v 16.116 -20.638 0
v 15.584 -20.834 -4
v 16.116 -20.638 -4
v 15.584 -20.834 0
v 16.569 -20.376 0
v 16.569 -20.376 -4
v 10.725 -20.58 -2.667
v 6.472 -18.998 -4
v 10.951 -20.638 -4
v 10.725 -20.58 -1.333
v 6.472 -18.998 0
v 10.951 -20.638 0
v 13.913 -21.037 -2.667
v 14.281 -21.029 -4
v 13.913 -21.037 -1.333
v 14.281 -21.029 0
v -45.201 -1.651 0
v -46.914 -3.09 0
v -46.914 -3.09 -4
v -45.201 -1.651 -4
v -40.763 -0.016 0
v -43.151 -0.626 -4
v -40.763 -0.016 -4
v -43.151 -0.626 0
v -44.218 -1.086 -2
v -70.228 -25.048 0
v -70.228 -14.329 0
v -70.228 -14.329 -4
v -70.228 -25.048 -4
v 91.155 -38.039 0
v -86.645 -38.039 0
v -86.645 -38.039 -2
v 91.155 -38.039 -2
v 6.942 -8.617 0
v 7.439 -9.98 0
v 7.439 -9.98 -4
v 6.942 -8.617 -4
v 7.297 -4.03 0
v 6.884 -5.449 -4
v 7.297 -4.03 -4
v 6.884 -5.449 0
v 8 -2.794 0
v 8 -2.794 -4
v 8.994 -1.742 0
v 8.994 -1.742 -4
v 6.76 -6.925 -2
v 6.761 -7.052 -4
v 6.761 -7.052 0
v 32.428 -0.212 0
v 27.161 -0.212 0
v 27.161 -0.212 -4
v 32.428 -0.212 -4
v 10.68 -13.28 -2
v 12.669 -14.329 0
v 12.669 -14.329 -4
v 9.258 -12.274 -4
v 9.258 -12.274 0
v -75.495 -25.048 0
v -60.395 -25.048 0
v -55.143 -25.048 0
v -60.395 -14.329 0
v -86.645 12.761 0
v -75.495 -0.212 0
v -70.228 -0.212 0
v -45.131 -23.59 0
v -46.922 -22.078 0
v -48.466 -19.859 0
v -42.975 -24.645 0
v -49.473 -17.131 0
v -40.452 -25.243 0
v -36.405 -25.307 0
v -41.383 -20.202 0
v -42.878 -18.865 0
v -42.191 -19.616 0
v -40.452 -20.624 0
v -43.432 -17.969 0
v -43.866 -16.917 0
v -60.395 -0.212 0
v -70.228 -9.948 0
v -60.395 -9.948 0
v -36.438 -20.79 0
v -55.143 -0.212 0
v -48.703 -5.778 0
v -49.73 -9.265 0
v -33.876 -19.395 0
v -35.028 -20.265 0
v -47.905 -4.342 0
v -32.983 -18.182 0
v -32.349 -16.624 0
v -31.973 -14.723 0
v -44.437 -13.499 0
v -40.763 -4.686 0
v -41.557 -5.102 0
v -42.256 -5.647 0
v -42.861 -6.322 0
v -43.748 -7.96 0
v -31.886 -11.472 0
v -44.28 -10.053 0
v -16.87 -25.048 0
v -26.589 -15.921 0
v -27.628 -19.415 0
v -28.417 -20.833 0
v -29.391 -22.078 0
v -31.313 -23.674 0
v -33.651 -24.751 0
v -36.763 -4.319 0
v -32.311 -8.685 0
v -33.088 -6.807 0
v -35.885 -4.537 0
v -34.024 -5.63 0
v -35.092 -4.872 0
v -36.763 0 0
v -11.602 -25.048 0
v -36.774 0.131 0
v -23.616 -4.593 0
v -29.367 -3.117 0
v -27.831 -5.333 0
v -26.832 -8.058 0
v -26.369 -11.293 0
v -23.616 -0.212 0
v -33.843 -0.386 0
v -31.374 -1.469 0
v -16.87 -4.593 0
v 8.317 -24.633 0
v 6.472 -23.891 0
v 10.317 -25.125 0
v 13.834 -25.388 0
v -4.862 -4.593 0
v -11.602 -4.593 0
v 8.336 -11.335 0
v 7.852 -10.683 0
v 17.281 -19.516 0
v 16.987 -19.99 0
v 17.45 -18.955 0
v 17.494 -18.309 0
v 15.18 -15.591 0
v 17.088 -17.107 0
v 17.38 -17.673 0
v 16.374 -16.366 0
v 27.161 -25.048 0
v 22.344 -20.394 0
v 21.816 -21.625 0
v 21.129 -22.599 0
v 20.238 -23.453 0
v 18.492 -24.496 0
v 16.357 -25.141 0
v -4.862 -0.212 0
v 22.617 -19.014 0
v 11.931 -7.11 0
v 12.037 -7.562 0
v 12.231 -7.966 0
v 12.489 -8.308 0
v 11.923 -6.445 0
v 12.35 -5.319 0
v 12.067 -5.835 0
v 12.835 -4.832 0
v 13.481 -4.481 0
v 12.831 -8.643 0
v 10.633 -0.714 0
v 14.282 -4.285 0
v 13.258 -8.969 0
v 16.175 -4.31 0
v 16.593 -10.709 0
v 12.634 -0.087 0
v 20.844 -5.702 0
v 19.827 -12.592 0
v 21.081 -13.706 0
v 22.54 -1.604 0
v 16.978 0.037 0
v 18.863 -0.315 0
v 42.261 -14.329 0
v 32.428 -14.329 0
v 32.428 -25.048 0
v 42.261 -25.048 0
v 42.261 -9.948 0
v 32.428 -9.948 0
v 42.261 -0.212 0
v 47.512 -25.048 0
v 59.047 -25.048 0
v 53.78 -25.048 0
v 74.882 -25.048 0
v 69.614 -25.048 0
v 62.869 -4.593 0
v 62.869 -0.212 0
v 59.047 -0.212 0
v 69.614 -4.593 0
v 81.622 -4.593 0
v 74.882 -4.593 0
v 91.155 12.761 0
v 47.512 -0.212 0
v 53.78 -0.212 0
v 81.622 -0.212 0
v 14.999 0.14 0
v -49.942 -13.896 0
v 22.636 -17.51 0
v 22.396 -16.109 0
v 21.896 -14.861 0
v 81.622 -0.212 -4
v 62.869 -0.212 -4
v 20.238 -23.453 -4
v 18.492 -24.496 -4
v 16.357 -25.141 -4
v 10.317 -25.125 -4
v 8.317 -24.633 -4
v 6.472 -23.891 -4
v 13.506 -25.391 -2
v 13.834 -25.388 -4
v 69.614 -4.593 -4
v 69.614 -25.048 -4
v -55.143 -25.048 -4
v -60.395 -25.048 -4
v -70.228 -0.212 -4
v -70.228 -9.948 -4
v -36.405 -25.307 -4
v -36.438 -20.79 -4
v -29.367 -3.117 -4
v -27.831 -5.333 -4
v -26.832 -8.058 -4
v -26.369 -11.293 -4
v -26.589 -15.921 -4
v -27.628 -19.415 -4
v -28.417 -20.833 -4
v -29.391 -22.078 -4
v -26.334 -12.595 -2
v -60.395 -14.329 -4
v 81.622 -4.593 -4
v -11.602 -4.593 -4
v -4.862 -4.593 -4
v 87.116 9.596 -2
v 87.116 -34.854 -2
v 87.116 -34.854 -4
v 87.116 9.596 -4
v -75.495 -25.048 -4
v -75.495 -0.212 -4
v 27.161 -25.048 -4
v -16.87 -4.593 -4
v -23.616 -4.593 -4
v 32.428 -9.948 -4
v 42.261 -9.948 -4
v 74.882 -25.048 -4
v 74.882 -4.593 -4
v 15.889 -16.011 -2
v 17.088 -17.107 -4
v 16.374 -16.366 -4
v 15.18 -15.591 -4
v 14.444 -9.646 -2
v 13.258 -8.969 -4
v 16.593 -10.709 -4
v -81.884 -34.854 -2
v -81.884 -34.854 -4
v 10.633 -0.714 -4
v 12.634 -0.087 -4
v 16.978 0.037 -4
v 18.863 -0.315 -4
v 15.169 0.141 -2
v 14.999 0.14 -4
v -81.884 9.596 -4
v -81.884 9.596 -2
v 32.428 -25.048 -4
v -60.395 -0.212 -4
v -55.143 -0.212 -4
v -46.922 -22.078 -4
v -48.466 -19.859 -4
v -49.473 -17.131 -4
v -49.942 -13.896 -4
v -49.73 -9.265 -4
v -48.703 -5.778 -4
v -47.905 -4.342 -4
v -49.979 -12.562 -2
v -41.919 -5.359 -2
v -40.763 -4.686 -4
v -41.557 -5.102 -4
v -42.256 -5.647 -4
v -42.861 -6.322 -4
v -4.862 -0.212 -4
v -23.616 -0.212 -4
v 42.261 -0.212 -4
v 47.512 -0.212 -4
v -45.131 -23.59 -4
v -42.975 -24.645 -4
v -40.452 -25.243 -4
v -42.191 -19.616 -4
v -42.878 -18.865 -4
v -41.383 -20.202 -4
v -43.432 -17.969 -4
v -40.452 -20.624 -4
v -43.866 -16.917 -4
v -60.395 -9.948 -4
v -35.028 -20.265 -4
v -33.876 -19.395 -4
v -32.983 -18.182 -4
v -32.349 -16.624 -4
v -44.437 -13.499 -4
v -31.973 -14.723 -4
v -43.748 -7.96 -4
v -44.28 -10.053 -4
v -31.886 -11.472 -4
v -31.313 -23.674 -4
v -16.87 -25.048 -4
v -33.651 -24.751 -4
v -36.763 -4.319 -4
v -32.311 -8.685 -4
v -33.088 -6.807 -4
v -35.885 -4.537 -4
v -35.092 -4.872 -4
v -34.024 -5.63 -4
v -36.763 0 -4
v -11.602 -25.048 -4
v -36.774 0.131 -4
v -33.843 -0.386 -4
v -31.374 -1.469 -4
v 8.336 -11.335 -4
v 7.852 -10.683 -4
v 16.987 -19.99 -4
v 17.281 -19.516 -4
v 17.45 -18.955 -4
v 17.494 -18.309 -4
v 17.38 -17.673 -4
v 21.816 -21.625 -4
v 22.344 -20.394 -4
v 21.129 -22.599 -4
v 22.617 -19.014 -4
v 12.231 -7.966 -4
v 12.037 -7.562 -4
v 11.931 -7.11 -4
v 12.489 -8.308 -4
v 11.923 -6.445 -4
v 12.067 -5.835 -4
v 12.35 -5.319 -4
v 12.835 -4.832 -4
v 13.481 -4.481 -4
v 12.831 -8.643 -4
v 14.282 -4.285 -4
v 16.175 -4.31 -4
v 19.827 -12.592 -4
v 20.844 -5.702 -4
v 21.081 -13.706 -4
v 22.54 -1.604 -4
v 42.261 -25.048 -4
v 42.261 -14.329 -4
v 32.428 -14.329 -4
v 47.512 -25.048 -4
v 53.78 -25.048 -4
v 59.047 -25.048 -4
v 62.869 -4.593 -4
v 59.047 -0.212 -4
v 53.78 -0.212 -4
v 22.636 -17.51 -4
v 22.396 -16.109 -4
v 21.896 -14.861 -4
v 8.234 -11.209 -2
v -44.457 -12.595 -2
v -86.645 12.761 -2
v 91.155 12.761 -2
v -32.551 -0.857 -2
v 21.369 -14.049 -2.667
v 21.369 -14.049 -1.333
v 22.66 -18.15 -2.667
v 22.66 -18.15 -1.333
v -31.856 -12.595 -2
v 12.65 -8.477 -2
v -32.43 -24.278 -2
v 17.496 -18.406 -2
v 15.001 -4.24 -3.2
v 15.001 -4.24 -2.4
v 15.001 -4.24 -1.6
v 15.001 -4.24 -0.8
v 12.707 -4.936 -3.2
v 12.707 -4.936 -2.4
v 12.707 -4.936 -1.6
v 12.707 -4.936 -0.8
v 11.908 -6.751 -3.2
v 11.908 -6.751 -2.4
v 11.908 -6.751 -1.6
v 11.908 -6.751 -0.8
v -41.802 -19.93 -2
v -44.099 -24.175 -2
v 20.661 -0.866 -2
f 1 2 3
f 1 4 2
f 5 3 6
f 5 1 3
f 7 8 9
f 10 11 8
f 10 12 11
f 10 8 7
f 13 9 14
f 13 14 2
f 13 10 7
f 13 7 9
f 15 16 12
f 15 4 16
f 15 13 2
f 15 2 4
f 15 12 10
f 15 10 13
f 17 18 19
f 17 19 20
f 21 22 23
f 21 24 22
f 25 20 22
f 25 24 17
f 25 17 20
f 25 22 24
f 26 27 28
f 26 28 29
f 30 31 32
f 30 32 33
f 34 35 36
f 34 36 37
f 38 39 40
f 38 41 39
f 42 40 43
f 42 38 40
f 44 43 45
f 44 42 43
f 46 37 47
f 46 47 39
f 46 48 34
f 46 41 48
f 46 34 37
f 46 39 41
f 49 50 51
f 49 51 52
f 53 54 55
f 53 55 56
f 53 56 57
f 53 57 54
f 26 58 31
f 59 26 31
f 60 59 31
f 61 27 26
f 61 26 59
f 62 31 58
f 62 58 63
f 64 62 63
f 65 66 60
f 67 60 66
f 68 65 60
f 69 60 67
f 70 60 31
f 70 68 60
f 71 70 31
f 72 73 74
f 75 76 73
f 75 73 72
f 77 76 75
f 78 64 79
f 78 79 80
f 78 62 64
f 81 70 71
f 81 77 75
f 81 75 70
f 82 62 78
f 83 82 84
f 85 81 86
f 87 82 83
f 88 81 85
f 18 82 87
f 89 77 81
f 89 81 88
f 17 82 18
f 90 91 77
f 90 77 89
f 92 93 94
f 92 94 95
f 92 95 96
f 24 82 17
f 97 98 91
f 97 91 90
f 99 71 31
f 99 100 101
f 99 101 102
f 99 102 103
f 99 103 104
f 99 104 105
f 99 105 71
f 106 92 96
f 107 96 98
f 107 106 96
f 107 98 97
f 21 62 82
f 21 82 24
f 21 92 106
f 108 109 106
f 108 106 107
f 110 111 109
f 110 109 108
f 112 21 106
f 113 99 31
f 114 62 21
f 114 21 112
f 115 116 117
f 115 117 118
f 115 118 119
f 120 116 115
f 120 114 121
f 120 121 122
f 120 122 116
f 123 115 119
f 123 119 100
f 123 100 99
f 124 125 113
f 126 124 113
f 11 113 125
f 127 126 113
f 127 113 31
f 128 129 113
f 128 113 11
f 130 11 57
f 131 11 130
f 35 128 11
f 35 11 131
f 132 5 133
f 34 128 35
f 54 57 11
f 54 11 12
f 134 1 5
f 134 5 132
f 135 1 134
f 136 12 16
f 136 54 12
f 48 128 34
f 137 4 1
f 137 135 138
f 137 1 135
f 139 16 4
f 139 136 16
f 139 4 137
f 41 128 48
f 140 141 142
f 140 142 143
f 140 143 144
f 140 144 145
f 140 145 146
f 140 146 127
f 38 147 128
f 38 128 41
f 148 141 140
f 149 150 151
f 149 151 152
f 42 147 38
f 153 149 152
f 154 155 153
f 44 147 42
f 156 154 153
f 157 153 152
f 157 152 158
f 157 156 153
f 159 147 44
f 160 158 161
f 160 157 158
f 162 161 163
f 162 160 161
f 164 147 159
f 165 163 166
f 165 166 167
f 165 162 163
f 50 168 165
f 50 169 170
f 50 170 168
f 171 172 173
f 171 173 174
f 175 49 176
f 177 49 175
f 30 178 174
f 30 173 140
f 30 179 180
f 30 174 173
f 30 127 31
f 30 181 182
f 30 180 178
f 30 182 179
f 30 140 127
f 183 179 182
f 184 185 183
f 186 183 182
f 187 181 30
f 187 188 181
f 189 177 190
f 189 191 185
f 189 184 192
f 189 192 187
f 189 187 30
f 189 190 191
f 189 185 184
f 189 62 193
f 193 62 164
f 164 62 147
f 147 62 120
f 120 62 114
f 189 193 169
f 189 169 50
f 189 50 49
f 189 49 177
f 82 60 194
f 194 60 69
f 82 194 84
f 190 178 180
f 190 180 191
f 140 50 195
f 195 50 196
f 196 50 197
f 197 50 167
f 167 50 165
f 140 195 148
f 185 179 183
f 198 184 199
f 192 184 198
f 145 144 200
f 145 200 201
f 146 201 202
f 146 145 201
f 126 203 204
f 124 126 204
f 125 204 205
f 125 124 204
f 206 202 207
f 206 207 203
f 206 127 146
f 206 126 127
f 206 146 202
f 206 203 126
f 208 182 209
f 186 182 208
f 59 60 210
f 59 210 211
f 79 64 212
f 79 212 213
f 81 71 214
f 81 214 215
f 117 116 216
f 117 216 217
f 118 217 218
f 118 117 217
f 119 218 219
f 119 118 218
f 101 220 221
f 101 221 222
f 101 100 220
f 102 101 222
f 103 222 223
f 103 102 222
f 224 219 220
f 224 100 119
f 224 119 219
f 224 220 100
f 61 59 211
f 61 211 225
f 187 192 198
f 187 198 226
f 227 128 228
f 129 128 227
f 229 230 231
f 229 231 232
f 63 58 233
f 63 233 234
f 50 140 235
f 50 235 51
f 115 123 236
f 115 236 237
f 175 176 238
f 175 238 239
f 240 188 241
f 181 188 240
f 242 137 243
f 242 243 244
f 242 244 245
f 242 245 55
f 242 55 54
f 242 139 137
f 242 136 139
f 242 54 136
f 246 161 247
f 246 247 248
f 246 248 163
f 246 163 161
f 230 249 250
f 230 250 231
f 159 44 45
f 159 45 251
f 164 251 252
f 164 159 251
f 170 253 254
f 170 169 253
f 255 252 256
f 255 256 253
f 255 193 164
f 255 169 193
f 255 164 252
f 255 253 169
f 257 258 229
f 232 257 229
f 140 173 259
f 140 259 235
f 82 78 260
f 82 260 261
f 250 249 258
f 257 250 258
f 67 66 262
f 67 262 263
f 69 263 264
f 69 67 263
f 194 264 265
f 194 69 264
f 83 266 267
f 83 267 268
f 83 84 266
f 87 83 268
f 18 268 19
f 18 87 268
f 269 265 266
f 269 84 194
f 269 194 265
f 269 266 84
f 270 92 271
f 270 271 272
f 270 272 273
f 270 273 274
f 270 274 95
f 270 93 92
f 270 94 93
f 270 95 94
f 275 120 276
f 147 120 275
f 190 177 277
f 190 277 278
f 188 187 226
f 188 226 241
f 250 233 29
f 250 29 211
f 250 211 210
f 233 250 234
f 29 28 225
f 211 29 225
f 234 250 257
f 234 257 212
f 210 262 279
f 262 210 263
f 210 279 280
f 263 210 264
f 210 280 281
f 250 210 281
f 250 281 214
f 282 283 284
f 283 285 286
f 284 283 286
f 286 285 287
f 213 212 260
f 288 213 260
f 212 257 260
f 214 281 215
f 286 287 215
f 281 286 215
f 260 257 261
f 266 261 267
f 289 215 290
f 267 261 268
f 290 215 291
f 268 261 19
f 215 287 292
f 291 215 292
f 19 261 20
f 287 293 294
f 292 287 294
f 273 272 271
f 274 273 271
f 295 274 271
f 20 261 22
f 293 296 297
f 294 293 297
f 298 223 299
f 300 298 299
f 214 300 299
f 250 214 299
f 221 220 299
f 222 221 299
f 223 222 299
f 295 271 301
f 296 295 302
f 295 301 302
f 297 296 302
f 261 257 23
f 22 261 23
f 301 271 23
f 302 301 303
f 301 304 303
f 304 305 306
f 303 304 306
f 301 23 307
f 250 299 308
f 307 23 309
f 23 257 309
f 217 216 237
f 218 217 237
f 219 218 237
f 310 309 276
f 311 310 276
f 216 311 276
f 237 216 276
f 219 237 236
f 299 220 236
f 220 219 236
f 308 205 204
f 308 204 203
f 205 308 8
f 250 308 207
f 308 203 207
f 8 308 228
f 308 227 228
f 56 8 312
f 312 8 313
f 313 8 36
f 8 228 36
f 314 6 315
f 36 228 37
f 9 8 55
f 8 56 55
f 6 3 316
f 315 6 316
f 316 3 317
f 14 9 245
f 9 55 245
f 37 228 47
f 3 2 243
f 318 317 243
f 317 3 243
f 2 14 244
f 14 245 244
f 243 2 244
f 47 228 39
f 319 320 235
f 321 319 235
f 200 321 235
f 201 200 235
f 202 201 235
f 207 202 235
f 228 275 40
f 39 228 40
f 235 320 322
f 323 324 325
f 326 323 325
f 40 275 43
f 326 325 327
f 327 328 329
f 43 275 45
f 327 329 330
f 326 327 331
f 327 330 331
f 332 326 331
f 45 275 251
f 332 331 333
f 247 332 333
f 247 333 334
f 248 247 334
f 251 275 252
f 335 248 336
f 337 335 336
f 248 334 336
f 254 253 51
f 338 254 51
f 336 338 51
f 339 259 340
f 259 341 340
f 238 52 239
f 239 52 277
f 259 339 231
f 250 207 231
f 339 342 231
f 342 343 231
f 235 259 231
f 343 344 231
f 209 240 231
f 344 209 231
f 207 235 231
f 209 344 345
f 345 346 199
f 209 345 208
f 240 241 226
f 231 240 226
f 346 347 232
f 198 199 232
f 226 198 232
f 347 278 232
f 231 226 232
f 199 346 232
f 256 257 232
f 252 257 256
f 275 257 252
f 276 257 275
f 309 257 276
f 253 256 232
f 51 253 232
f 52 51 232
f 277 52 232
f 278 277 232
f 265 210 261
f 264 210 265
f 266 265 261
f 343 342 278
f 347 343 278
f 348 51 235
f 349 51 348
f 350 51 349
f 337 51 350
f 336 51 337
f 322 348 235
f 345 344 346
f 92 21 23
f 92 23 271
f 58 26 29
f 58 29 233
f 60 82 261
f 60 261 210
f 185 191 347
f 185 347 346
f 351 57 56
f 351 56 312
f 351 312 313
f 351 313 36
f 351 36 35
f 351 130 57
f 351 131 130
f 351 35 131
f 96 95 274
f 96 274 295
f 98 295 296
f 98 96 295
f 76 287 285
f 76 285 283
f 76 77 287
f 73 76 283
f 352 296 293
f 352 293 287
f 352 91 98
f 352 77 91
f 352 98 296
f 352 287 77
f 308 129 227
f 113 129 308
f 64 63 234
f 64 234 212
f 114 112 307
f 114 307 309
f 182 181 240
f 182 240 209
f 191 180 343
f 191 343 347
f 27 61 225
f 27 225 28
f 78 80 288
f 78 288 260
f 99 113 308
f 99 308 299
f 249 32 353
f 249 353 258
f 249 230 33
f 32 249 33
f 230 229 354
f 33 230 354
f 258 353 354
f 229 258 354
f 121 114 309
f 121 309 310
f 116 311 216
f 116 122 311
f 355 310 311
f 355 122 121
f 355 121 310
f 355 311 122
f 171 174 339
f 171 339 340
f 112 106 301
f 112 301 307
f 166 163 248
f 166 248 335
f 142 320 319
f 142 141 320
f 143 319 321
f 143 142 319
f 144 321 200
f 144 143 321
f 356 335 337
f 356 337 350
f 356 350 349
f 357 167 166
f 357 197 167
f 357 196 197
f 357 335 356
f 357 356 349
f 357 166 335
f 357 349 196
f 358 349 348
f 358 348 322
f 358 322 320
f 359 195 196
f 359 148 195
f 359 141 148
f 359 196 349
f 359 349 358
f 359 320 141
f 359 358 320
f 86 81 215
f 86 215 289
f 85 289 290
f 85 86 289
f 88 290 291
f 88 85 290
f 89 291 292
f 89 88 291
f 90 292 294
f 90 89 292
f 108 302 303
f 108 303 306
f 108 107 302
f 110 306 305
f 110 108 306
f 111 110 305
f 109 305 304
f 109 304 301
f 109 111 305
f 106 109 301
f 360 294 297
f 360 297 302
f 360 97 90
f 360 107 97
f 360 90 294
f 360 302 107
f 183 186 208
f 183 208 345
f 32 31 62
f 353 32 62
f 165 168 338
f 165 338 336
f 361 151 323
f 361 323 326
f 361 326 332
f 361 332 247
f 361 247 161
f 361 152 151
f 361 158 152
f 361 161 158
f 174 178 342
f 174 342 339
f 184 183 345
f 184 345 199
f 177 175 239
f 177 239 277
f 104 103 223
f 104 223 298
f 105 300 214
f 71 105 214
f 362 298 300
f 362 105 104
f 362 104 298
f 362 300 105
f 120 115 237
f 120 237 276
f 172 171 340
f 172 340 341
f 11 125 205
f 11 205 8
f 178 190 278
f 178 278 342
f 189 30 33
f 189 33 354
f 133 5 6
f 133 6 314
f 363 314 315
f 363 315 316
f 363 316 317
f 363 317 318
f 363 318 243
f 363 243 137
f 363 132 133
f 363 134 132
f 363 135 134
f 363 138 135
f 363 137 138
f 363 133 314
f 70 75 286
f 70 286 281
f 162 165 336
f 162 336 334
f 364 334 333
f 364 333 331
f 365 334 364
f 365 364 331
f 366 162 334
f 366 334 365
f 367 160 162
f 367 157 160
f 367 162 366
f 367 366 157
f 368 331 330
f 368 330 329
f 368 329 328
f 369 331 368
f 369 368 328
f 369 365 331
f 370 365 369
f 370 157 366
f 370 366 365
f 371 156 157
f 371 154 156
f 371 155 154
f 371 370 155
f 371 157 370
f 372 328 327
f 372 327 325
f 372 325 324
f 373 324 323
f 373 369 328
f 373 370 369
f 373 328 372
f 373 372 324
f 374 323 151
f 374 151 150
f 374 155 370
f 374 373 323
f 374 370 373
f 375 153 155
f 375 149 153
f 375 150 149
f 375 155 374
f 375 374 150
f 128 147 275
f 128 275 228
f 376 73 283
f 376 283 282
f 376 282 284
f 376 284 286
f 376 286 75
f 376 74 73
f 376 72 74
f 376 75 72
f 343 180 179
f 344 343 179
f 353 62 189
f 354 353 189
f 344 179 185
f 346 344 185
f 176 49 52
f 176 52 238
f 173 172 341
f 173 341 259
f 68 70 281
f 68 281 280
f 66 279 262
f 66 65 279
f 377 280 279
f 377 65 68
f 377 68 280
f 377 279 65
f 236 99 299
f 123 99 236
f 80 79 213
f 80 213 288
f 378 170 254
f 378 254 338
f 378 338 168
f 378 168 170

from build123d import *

# Parameters (mm, degrees)
F0_W     = 169
F0_H     = 44.45
F0_W_2   = 5.2673268342
F0_H_2   = 24.8363429365
F1_DEPTH = 4
F0_W_3   = 177.8
F0_H_3   = 50.8
F2_DEPTH = 2


with BuildPart() as f1:
    # F0 (on Top) → F1 (new body)
    with BuildSketch(Plane.XY):
        with Locations((2.6164503098, -12.6290581763)):
            Rectangle(F0_W, F0_H)
        Polygon((-55.1434959277, -0.2119976744), (-55.1434959277, -25.0483406109), (-60.3945152484, -25.0483406109), (-60.3945152484, -14.3288684571), (-70.2279458398, -14.3288684571), (-70.2279458398, -25.0483406109), (-75.495272674, -25.0483406109), (-75.495272674, -0.2119976744), (-70.2279458398, -0.2119976744), (-70.2279458398, -9.9475831853), (-60.3945152484, -9.9475831853), (-60.3945152484, -0.2119976744), align=None, mode=Mode.SUBTRACT)
        with BuildLine():
            Line((-40.7634110153, -0.0159870709), (-40.7634110153, 0))
            Line((-40.7634110153, 0), (-40.7634110153, 1.3887999812))
            Line((-40.7634110153, 1.3887999812), (-36.8744060397, 1.3887999812))
            Line((-36.8744060397, 1.3887999812), (-36.7738648248, 0.1308009128))
            add(Edge.make_bspline(
                [(-36.7738648248, 0.1308009128), (-32.0317465053, -0.2208247915), (-29.3667530507, -3.1174529818)],
                knots=[0.1213913838, 0.1213913838, 0.1213913838, 1, 1, 1], degree=2))
            add(Edge.make_bspline(
                [(-29.3667530507, -3.1174529818), (-26.3335555549, -6.4142886113), (-26.3335555549, -12.5948361969)],
                knots=[0, 0, 0, 1, 1, 1], degree=2))
            add(Edge.make_bspline(
                [(-26.3335555549, -12.5948361969), (-26.3335555549, -18.764512107), (-29.3912143208, -22.0776552498)],
                knots=[0, 0, 0, 1, 1, 1], degree=2))
            add(Edge.make_bspline(
                [(-29.3912143208, -22.0776552498), (-31.96172627, -24.8629477529), (-36.405085353, -25.3067011213)],
                knots=[0, 0, 0, 0.8406797965, 0.8406797965, 0.8406797965], degree=2))
            Line((-36.405085353, -25.3067011213), (-36.4003777504, -25.9454939514))
            Line((-36.4003777504, -25.9454939514), (-40.4519320428, -25.9454939514))
            Line((-40.4519320428, -25.9454939514), (-40.4519320428, -25.2426429066))
            add(Edge.make_bspline(
                [(-40.4519320428, -25.2426429066), (-44.5107206961, -24.6901841388), (-46.9217912458, -22.0776552498)],
                knots=[0.2114651326, 0.2114651326, 0.2114651326, 1, 1, 1], degree=2))
            add(Edge.make_bspline(
                [(-46.9217912458, -22.0776552498), (-49.9794500118, -18.764512107), (-49.9794500118, -12.5622211701)],
                knots=[0, 0, 0, 1, 1, 1], degree=2))
            add(Edge.make_bspline(
                [(-49.9794500118, -12.5622211701), (-49.9794500118, -6.3599302332), (-46.9136374891, -3.0902737928)],
                knots=[0, 0, 0, 1, 1, 1], degree=2))
            add(Edge.make_bspline(
                [(-46.9136374891, -3.0902737928), (-44.5972413071, -0.6198619073), (-40.7634110153, -0.0159870709)],
                knots=[0, 0, 0, 0.7555570228, 0.7555570228, 0.7555570228], degree=2))
        make_face(mode=Mode.SUBTRACT)
        Polygon((-11.6024351001, -4.5932829462), (-11.6024351001, -25.0483406109), (-16.8697619343, -25.0483406109), (-16.8697619343, -4.5932829462), (-23.6156366518, -4.5932829462), (-23.6156366518, -0.2119976744), (-4.8619962204, -0.2119976744), (-4.8619962204, -4.5932829462), align=None, mode=Mode.SUBTRACT)
        with BuildLine():
            add(Edge.make_bspline(
                [(21.3686391133, -14.0489228101), (22.6596505923, -15.7204429355), (22.6596505923, -18.1502624349)],
                knots=[0, 0, 0, 1, 1, 1], degree=2))
            add(Edge.make_bspline(
                [(22.6596505923, -18.1502624349), (22.6596505923, -21.5150460369), (20.2379848496, -23.4529222148)],
                knots=[0, 0, 0, 1, 1, 1], degree=2))
            add(Edge.make_bspline(
                [(20.2379848496, -23.4529222148), (17.816319107, -25.3907983927), (13.5056997267, -25.3907983927)],
                knots=[0, 0, 0, 1, 1, 1], degree=2))
            add(Edge.make_bspline(
                [(13.5056997267, -25.3907983927), (9.5266664525, -25.3907983927), (6.4717256055, -23.8905071582)],
                knots=[0, 0, 0, 1, 1, 1], degree=2))
            Line((6.4717256055, -23.8905071582), (6.4717256055, -18.9982531326))
            add(Edge.make_bspline(
                [(6.4717256055, -18.9982531326), (8.9830826719, -20.1234715585), (10.7252686888, -20.5800819342)],
                knots=[0, 0, 0, 1, 1, 1], degree=2))
            add(Edge.make_bspline(
                [(10.7252686888, -20.5800819342), (12.4674547057, -21.0366923099), (13.9133875621, -21.0366923099)],
                knots=[0, 0, 0, 1, 1, 1], degree=2))
            add(Edge.make_bspline(
                [(13.9133875621, -21.0366923099), (15.6419839845, -21.0366923099), (16.5687943305, -20.3762380165)],
                knots=[0, 0, 0, 1, 1, 1], degree=2))
            add(Edge.make_bspline(
                [(16.5687943305, -20.3762380165), (17.4956046764, -19.715783723), (17.4956046764, -18.4057468117)],
                knots=[0, 0, 0, 1, 1, 1], degree=2))
            add(Edge.make_bspline(
                [(17.4956046764, -18.4057468117), (17.4956046764, -17.6773445457), (17.0879168409, -17.1065815761)],
                knots=[0, 0, 0, 1, 1, 1], degree=2))
            add(Edge.make_bspline(
                [(17.0879168409, -17.1065815761), (16.6802290055, -16.5358186064), (15.8893146047, -16.0112602581)],
                knots=[0, 0, 0, 1, 1, 1], degree=2))
            add(Edge.make_bspline(
                [(15.8893146047, -16.0112602581), (15.0984002039, -15.4867019098), (12.6685807045, -14.3288684571)],
                knots=[0, 0, 0, 1, 1, 1], degree=2))
            add(Edge.make_bspline(
                [(12.6685807045, -14.3288684571), (10.3964005015, -13.2580084093), (9.2575924811, -12.2741217664)],
                knots=[0, 0, 0, 1, 1, 1], degree=2))
            add(Edge.make_bspline(
                [(9.2575924811, -12.2741217664), (8.1187844607, -11.2902351234), (7.439304735, -9.9801982122)],
                knots=[0, 0, 0, 1, 1, 1], degree=2))
            add(Edge.make_bspline(
                [(7.439304735, -9.9801982122), (6.7598250092, -8.6701613009), (6.7598250092, -6.9252573651)],
                knots=[0, 0, 0, 1, 1, 1], degree=2))
            add(Edge.make_bspline(
                [(6.7598250092, -6.9252573651), (6.7598250092, -3.6257038167), (8.9939543475, -1.7421860169)],
                knots=[0, 0, 0, 1, 1, 1], degree=2))
            add(Edge.make_bspline(
                [(8.9939543475, -1.7421860169), (11.2280836859, 0.141331783), (15.1690660954, 0.141331783)],
                knots=[0, 0, 0, 1, 1, 1], degree=2))
            add(Edge.make_bspline(
                [(15.1690660954, 0.141331783), (17.1042243544, 0.141331783), (18.8627178847, -0.3152785928)],
                knots=[0, 0, 0, 1, 1, 1], degree=2))
            add(Edge.make_bspline(
                [(18.8627178847, -0.3152785928), (20.621211415, -0.7718889685), (22.5400621606, -1.6035721528)],
                knots=[0, 0, 0, 1, 1, 1], degree=2))
            Line((22.5400621606, -1.6035721528), (20.844080765, -5.7021938587))
            add(Edge.make_bspline(
                [(20.844080765, -5.7021938587), (18.854564128, -4.8868181878), (17.5553988923, -4.5633858383)],
                knots=[0, 0, 0, 1, 1, 1], degree=2))
            add(Edge.make_bspline(
                [(17.5553988923, -4.5633858383), (16.2562336566, -4.2399534888), (15.0005551234, -4.2399534888)],
                knots=[0, 0, 0, 1, 1, 1], degree=2))
            add(Edge.make_bspline(
                [(15.0005551234, -4.2399534888), (13.5056997267, -4.2399534888), (12.7066315692, -4.935740728)],
                knots=[0, 0, 0, 1, 1, 1], degree=2))
            add(Edge.make_bspline(
                [(12.7066315692, -4.935740728), (11.9075634117, -5.6315279672), (11.9075634117, -6.7513105553)],
                knots=[0, 0, 0, 1, 1, 1], degree=2))
            add(Edge.make_bspline(
                [(11.9075634117, -6.7513105553), (11.9075634117, -7.4470977945), (12.2309957611, -7.966220305)],
                knots=[0, 0, 0, 1, 1, 1], degree=2))
            add(Edge.make_bspline(
                [(12.2309957611, -7.966220305), (12.5544281106, -8.4853428155), (13.2583691065, -8.9691323802)],
                knots=[0, 0, 0, 1, 1, 1], degree=2))
            add(Edge.make_bspline(
                [(13.2583691065, -8.9691323802), (13.9623101024, -9.452921945), (16.5932556006, -10.7086004782)],
                knots=[0, 0, 0, 1, 1, 1], degree=2))
            add(Edge.make_bspline(
                [(16.5932556006, -10.7086004782), (20.0776276343, -12.3774026847), (21.3686391133, -14.0489228101)],
                knots=[0, 0, 0, 1, 1, 1], degree=2))
        make_face(mode=Mode.SUBTRACT)
        Polygon((47.5123010422, -0.2119976744), (47.5123010422, -25.0483406109), (42.2612817214, -25.0483406109), (42.2612817214, -14.3288684571), (32.42785113, -14.3288684571), (32.42785113, -25.0483406109), (27.1605242958, -25.0483406109), (27.1605242958, -0.2119976744), (32.42785113, -0.2119976744), (32.42785113, -9.9475831853), (42.2612817214, -9.9475831853), (42.2612817214, -0.2119976744), align=None, mode=Mode.SUBTRACT)
        with Locations((56.4134854498, -12.6301691427)):
            Rectangle(F0_W_2, F0_H_2, mode=Mode.SUBTRACT)
        Polygon((74.8817443963, -4.5932829462), (74.8817443963, -25.0483406109), (69.6144175621, -25.0483406109), (69.6144175621, -4.5932829462), (62.8685428446, -4.5932829462), (62.8685428446, -0.2119976744), (81.622183276, -0.2119976744), (81.622183276, -4.5932829462), align=None, mode=Mode.SUBTRACT)
        with BuildLine():
            Line((-40.7634110153, 1.3887999812), (-40.7634110153, 0))
            Line((-40.7634110153, 0), (-40.7634110153, -0.0159870709))
            add(Edge.make_bspline(
                [(-40.7634110153, -0.0159870709), (-39.5230640096, 0.1793826476), (-38.1238877565, 0.1793826476)],
                knots=[0.7555570228, 0.7555570228, 0.7555570228, 1, 1, 1], degree=2))
            add(Edge.make_bspline(
                [(-38.1238877565, 0.1793826476), (-37.429051098, 0.1793826476), (-36.7738648248, 0.1308009128)],
                knots=[0, 0, 0, 0.1213913838, 0.1213913838, 0.1213913838], degree=2))
            Line((-36.7738648248, 0.1308009128), (-36.8744060397, 1.3887999812))
            Line((-36.8744060397, 1.3887999812), (-40.7634110153, 1.3887999812))
        make_face()
        with BuildLine():
            add(Edge.make_bspline(
                [(-40.7634110153, -0.0159870709), (-39.5230640096, 0.1793826476), (-38.1238877565, 0.1793826476)],
                knots=[0.7555570228, 0.7555570228, 0.7555570228, 1, 1, 1], degree=2))
            Line((-40.7634110153, -0.0159870709), (-40.7634110153, -4.6859490545))
            add(Edge.make_bspline(
                [(-38.1238877565, -4.207338462), (-39.6186682979, -4.207338462), (-40.7634110153, -4.6859490545)],
                knots=[0, 0, 0, 0.475754722, 0.475754722, 0.475754722], degree=2))
            add(Edge.make_bspline(
                [(-36.7634110153, -4.3185824581), (-37.4020860912, -4.207338462), (-38.1238877565, -4.207338462)],
                knots=[0.8848345835, 0.8848345835, 0.8848345835, 1, 1, 1], degree=2))
            Line((-36.7634110153, -4.3185824581), (-36.7634110153, 0))
            Line((-36.7634110153, 0), (-36.7738648248, 0.1308009128))
            add(Edge.make_bspline(
                [(-38.1238877565, 0.1793826476), (-37.429051098, 0.1793826476), (-36.7738648248, 0.1308009128)],
                knots=[0, 0, 0, 0.1213913838, 0.1213913838, 0.1213913838], degree=2))
        make_face()
        with BuildLine():
            add(Edge.make_bspline(
                [(-38.1238877565, -4.207338462), (-39.6186682979, -4.207338462), (-40.7634110153, -4.6859490545)],
                knots=[0, 0, 0, 0.475754722, 0.475754722, 0.475754722], degree=2))
            Line((-40.7634110153, -4.6859490545), (-40.7634110153, -4.7359894961))
            Line((-40.7634110153, -4.7359894961), (-36.7634110153, -4.9380864948))
            Line((-36.7634110153, -4.9380864948), (-36.7634110153, -4.3185824581))
            add(Edge.make_bspline(
                [(-36.7634110153, -4.3185824581), (-37.4020860912, -4.207338462), (-38.1238877565, -4.207338462)],
                knots=[0.8848345835, 0.8848345835, 0.8848345835, 1, 1, 1], degree=2))
        make_face()
        with BuildLine():
            Line((-40.7634110153, -4.7359894961), (-40.7634110153, -4.6859490545))
            add(Edge.make_bspline(
                [(-40.7634110153, -4.6859490545), (-42.0248298439, -5.2133412831), (-42.8612204046, -6.3218793686)],
                knots=[0.475754722, 0.475754722, 0.475754722, 1, 1, 1], degree=2))
            add(Edge.make_bspline(
                [(-42.8612204046, -6.3218793686), (-44.4566388007, -8.4364202752), (-44.4566388007, -12.5948361969)],
                knots=[0, 0, 0, 1, 1, 1], degree=2))
            add(Edge.make_bspline(
                [(-44.4566388007, -12.5948361969), (-44.4566388007, -16.7586879565), (-42.877527918, -18.8650751064)],
                knots=[0, 0, 0, 1, 1, 1], degree=2))
            add(Edge.make_bspline(
                [(-42.877527918, -18.8650751064), (-41.9401032757, -20.115512452), (-40.4519320428, -20.6236391757)],
                knots=[0, 0, 0, 0.5936407966, 0.5936407966, 0.5936407966], degree=2))
            Line((-40.4519320428, -20.6236391757), (-40.4519320428, -18.9498923719))
            Line((-40.4519320428, -18.9498923719), (-36.4519320428, -18.9498923719))
            Line((-36.4519320428, -18.9498923719), (-36.4383714184, -20.7899860206))
            add(Edge.make_bspline(
                [(-36.4383714184, -20.7899860206), (-31.856366766, -19.7385151508), (-31.856366766, -12.5948361969)],
                knots=[0.1471889872, 0.1471889872, 0.1471889872, 1, 1, 1], degree=2))
            add(Edge.make_bspline(
                [(-31.856366766, -12.5948361969), (-31.856366766, -5.173288132), (-36.7634110153, -4.3185824581)],
                knots=[0, 0, 0, 0.8848345835, 0.8848345835, 0.8848345835], degree=2))
            Line((-36.7634110153, -4.3185824581), (-36.7634110153, -4.9380864948))
            Line((-36.7634110153, -4.9380864948), (-40.7634110153, -4.7359894961))
        make_face()
        with BuildLine():
            add(Edge.make_bspline(
                [(-38.1565027833, -25.3907983927), (-39.3634674537, -25.3907983927), (-40.4519320428, -25.2426429066)],
                knots=[0, 0, 0, 0.2114651326, 0.2114651326, 0.2114651326], degree=2))
            Line((-40.4519320428, -25.2426429066), (-40.4519320428, -25.9454939514))
            Line((-40.4519320428, -25.9454939514), (-36.4003777504, -25.9454939514))
            Line((-36.4003777504, -25.9454939514), (-36.405085353, -25.3067011213))
            add(Edge.make_bspline(
                [(-36.405085353, -25.3067011213), (-37.2471620585, -25.3907983927), (-38.1565027833, -25.3907983927)],
                knots=[0.8406797965, 0.8406797965, 0.8406797965, 1, 1, 1], degree=2))
        make_face()
        with BuildLine():
            Line((-40.4519320428, -25.0483406109), (-40.4519320428, -25.2426429066))
            add(Edge.make_bspline(
                [(-38.1565027833, -25.3907983927), (-39.3634674537, -25.3907983927), (-40.4519320428, -25.2426429066)],
                knots=[0, 0, 0, 0.2114651326, 0.2114651326, 0.2114651326], degree=2))
            add(Edge.make_bspline(
                [(-36.405085353, -25.3067011213), (-37.2471620585, -25.3907983927), (-38.1565027833, -25.3907983927)],
                knots=[0.8406797965, 0.8406797965, 0.8406797965, 1, 1, 1], degree=2))
            Line((-36.405085353, -25.3067011213), (-36.4383714184, -20.7899860206))
            add(Edge.make_bspline(
                [(-38.1565027833, -20.9714622563), (-37.2291921439, -20.9714622563), (-36.4383714184, -20.7899860206)],
                knots=[0, 0, 0, 0.1471889872, 0.1471889872, 0.1471889872], degree=2))
            add(Edge.make_bspline(
                [(-40.4519320428, -20.6236391757), (-39.4332485559, -20.9714622563), (-38.1565027833, -20.9714622563)],
                knots=[0.5936407966, 0.5936407966, 0.5936407966, 1, 1, 1], degree=2))
            Line((-40.4519320428, -20.6236391757), (-40.4519320428, -25.0483406109))
        make_face()
        with BuildLine():
            add(Edge.make_bspline(
                [(-38.1565027833, -20.9714622563), (-37.2291921439, -20.9714622563), (-36.4383714184, -20.7899860206)],
                knots=[0, 0, 0, 0.1471889872, 0.1471889872, 0.1471889872], degree=2))
            Line((-36.4383714184, -20.7899860206), (-36.4519320428, -18.9498923719))
            Line((-36.4519320428, -18.9498923719), (-40.4519320428, -18.9498923719))
            Line((-40.4519320428, -18.9498923719), (-40.4519320428, -20.6236391757))
            add(Edge.make_bspline(
                [(-40.4519320428, -20.6236391757), (-39.4332485559, -20.9714622563), (-38.1565027833, -20.9714622563)],
                knots=[0.5936407966, 0.5936407966, 0.5936407966, 1, 1, 1], degree=2))
        make_face()
    extrude(amount=-F1_DEPTH)

    # F0 (on Top) → F2 (join)
    with BuildSketch(Plane.XY):
        with Locations((2.2549219429, -12.638609002)):
            Rectangle(F0_W_3, F0_H_3)
        with Locations((2.6164503098, -12.6290581763)):
            Rectangle(F0_W, F0_H, mode=Mode.SUBTRACT)
    extrude(amount=-F2_DEPTH)


solid = f1.part
